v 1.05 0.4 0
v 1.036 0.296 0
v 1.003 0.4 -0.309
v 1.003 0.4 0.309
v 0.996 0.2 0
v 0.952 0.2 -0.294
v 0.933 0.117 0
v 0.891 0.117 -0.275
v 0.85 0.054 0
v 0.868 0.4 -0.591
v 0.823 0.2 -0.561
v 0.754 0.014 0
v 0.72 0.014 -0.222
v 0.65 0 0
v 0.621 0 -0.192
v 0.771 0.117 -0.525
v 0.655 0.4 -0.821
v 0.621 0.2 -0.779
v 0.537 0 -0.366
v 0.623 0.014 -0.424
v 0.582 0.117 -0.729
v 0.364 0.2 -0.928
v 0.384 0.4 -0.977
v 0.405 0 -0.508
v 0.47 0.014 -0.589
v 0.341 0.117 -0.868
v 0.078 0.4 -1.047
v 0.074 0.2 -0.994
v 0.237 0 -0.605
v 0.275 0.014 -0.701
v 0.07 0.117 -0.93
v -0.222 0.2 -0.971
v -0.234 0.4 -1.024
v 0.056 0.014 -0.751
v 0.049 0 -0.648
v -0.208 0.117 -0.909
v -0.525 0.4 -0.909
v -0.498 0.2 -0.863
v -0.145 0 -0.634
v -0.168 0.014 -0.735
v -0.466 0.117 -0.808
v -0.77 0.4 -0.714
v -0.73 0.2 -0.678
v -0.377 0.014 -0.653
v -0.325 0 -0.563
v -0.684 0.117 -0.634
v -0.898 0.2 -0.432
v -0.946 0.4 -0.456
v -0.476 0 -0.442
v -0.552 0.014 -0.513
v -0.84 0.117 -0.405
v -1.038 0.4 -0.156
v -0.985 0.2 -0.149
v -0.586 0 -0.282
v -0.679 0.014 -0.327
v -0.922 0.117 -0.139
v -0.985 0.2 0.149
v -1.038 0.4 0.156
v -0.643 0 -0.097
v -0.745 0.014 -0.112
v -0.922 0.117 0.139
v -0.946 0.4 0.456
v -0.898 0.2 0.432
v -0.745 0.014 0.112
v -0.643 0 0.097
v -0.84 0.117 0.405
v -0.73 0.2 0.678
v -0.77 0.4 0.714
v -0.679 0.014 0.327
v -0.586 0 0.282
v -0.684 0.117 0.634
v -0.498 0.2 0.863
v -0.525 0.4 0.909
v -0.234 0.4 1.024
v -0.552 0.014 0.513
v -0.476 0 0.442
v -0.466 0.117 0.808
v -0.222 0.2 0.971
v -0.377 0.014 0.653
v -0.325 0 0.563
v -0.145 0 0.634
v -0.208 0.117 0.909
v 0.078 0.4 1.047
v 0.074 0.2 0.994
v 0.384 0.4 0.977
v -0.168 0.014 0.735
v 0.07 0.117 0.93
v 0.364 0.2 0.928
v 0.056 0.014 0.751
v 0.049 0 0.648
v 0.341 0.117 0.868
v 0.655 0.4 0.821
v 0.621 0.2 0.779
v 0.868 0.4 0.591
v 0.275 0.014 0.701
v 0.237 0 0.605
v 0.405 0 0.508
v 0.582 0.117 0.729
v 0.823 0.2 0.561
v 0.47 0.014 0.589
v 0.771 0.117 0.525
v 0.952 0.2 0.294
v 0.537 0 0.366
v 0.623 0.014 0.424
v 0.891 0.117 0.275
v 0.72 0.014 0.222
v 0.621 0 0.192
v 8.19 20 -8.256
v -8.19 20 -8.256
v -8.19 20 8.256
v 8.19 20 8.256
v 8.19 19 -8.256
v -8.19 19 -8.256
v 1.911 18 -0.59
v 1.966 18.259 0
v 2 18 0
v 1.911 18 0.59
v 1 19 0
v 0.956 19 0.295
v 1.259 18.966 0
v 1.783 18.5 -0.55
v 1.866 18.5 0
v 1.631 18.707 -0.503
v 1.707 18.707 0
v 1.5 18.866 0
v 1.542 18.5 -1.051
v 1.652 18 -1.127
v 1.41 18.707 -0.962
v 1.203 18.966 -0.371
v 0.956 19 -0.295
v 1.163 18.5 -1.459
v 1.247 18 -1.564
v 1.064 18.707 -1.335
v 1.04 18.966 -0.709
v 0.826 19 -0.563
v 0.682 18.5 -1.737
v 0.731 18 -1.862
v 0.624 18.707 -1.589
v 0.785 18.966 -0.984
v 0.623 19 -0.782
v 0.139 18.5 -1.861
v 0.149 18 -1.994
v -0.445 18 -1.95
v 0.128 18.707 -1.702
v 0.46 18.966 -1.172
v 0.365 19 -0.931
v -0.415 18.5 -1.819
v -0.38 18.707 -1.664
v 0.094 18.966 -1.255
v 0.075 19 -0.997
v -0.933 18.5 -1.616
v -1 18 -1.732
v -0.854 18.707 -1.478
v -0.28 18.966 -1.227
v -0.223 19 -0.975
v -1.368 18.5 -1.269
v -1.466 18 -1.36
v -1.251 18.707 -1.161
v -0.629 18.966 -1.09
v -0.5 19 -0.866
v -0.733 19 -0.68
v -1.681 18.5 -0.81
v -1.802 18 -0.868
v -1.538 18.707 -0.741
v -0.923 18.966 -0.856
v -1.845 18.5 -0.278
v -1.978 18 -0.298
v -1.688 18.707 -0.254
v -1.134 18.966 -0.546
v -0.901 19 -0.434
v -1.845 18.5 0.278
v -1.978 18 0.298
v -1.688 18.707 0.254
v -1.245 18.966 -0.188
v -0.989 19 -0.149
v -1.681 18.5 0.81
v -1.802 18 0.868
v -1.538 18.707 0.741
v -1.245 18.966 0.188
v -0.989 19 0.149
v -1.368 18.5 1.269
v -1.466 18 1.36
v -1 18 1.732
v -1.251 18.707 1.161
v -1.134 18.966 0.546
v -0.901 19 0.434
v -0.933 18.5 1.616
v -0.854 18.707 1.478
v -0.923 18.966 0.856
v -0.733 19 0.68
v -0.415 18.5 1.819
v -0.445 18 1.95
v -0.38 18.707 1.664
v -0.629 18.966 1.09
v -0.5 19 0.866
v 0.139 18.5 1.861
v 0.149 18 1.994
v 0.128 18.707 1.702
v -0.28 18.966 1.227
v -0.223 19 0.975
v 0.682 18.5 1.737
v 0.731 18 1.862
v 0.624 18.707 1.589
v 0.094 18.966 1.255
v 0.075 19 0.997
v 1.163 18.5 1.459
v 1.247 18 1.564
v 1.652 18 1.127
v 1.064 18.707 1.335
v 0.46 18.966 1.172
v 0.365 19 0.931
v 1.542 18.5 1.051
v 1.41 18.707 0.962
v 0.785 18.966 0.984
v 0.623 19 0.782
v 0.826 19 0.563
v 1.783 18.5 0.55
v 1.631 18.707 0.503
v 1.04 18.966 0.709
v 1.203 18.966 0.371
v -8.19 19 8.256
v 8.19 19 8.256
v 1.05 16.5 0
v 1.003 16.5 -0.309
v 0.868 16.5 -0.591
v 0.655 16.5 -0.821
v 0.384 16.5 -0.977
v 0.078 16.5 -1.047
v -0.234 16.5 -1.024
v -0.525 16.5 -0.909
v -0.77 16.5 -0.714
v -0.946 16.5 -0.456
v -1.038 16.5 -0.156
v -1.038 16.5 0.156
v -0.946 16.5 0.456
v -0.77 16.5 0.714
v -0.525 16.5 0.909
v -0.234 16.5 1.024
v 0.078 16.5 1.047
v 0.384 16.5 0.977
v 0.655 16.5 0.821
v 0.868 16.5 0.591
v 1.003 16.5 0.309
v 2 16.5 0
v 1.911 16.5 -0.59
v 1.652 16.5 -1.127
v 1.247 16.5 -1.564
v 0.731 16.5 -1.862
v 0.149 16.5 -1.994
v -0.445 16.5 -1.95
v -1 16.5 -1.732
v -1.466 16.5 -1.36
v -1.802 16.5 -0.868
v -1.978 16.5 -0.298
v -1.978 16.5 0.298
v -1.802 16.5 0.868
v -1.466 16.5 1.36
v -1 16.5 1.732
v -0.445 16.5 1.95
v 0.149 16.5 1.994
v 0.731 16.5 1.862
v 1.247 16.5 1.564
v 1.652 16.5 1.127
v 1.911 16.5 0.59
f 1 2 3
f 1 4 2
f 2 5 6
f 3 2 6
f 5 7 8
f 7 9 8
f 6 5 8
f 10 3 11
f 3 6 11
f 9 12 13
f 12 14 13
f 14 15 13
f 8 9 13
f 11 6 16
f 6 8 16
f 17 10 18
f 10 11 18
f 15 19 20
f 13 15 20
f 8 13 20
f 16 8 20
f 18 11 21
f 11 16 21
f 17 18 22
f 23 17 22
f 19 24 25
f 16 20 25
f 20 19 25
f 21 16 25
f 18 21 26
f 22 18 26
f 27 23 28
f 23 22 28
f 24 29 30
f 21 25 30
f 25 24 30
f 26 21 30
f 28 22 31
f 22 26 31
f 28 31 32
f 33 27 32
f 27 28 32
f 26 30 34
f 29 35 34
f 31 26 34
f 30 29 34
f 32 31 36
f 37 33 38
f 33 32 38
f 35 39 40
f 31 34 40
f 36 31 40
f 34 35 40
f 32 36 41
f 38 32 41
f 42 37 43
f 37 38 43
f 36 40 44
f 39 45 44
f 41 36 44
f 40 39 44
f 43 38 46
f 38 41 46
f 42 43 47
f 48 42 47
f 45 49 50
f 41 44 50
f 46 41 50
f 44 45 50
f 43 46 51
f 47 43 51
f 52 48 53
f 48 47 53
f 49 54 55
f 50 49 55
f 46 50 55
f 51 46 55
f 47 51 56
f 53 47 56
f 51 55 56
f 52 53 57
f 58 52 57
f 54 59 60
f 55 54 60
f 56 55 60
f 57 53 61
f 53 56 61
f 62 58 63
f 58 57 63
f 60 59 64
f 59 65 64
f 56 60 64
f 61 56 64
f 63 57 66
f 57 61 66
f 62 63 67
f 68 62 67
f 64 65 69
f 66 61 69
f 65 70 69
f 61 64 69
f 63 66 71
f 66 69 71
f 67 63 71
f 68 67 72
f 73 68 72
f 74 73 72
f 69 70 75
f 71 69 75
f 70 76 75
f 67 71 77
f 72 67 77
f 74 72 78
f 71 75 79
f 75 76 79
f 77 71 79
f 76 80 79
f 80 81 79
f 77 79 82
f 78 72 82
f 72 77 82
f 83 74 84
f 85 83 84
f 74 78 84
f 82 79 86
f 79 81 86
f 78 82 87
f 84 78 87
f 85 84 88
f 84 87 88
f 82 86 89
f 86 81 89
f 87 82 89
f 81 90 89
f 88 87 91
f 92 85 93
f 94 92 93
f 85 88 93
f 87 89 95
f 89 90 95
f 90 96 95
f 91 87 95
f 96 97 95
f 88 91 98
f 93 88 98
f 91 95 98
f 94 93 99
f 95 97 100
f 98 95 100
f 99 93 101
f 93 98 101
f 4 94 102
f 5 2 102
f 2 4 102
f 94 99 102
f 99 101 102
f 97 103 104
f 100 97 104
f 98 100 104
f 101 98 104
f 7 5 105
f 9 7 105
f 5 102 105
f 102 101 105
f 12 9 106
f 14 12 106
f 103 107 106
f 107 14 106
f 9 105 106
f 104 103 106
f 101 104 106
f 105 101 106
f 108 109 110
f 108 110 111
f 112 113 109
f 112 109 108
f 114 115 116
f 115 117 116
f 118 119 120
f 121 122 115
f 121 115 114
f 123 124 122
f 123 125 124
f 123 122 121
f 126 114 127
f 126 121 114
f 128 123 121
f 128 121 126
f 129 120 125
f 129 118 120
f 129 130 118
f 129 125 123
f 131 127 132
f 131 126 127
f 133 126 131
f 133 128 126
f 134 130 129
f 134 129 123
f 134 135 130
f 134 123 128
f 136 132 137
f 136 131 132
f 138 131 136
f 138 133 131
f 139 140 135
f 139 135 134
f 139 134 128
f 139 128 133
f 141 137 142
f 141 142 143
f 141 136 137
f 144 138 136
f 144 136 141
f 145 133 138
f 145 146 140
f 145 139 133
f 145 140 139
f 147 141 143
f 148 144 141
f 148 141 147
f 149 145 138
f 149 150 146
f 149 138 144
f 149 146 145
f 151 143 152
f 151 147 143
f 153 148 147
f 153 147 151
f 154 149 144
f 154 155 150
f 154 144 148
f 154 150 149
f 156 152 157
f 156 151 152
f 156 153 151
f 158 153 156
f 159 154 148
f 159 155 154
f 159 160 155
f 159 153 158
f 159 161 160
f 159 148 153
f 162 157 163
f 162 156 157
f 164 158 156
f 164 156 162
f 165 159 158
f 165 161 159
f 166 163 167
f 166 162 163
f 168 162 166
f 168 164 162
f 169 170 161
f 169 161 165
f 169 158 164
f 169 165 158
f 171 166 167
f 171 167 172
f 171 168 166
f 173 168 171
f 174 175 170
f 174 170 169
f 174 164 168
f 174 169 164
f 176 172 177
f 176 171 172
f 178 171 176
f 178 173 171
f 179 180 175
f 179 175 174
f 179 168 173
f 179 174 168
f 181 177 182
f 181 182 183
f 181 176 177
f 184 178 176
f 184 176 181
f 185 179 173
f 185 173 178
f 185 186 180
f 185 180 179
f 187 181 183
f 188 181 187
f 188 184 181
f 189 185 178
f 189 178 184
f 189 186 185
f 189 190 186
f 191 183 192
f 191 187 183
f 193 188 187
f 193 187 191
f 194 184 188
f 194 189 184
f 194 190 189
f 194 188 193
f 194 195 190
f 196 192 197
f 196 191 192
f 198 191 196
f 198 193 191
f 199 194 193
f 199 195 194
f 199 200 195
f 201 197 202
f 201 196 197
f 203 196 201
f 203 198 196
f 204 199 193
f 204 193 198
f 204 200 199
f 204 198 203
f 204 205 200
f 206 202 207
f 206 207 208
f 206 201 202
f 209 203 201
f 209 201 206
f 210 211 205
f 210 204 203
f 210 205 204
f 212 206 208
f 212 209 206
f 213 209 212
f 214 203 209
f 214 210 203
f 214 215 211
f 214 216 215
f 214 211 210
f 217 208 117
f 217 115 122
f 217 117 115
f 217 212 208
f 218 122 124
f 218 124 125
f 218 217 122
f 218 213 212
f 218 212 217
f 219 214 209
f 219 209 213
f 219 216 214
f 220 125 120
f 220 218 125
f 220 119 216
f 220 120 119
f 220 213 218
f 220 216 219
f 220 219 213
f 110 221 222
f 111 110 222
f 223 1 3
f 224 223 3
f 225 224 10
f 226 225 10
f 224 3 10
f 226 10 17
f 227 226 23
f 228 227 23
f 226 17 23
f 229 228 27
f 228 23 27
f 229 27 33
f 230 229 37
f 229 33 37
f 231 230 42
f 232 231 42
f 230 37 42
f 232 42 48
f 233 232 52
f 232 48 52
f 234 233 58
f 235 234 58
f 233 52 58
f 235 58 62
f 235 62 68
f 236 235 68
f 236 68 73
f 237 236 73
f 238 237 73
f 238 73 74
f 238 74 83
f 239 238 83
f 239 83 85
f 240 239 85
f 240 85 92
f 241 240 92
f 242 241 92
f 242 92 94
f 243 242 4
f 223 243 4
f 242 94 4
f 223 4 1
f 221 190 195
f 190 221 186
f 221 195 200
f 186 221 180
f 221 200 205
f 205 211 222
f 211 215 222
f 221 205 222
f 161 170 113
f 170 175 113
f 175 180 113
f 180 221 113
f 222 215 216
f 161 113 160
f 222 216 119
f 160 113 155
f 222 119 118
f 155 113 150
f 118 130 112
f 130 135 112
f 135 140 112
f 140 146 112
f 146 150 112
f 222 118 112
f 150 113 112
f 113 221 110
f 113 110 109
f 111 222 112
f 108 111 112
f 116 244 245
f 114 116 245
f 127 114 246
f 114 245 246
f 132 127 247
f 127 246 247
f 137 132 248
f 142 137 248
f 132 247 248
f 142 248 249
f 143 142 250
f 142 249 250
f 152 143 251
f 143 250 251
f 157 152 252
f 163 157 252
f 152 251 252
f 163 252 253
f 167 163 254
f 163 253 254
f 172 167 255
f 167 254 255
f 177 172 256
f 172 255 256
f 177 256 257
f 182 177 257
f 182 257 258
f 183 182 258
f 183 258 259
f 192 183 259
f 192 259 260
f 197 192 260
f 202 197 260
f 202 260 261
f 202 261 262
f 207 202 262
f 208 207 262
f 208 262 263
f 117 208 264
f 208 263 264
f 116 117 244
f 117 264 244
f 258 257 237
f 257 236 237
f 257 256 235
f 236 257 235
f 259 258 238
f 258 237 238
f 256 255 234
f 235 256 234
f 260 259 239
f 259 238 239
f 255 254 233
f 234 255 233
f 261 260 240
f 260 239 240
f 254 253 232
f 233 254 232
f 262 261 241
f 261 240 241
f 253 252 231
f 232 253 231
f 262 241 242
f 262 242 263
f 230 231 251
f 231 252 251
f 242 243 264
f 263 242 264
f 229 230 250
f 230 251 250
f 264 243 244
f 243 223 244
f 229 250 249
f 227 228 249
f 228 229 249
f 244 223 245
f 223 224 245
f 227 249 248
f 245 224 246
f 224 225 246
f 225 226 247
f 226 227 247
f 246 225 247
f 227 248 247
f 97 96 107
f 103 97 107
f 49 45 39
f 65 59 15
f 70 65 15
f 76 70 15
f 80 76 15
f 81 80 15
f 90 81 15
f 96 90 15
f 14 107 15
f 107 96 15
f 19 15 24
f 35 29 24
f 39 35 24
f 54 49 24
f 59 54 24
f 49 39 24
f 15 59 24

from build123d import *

# Parameters (mm, degrees)
SKETCH1_R           = 1.05
BOSS_EXTRUDE1_DEPTH = 16.5
SKETCH2_R           = 2
BOSS_EXTRUDE2_DEPTH = 2.5
FILLET1_R           = 0.4
FILLET2_R           = 1
SKETCH3_W           = 16.37962499
SKETCH3_H           = 16.511817854
BOSS_EXTRUDE3_DEPTH = 1


with BuildPart() as part:
    # Sketch1 → Boss-Extrude1 (new body)
    with BuildSketch(Plane(origin=(0, 0, 0), x_dir=(1, 0, 0), z_dir=(0, 1, 0))):
        Circle(SKETCH1_R)
    extrude(amount=BOSS_EXTRUDE1_DEPTH)

    # Sketch2 → Boss-Extrude2 (add)
    with BuildSketch(Plane(origin=(0, 16.5, 0), x_dir=(1, 0, 0), z_dir=(0, 1, 0))):
        Circle(SKETCH2_R)
    extrude(amount=BOSS_EXTRUDE2_DEPTH)

    # Fillet1
    fillet1_edges = [part.edges().sort_by_distance(p)[0] for p in [
        (-1.05, 0, 0),
    ]]
    fillet(fillet1_edges, radius=FILLET1_R)

    # Fillet2
    fillet2_edges = [part.edges().sort_by_distance(p)[0] for p in [
        (-2, 19, 0),
    ]]
    fillet(fillet2_edges, radius=FILLET2_R)

    # Sketch3 → Boss-Extrude3 (add)
    with BuildSketch(Plane(origin=(0, 19, 0), x_dir=(1, 0, 0), z_dir=(0, 1, 0))):
        Rectangle(SKETCH3_W, SKETCH3_H)
    extrude(amount=BOSS_EXTRUDE3_DEPTH)


solid = part.part
